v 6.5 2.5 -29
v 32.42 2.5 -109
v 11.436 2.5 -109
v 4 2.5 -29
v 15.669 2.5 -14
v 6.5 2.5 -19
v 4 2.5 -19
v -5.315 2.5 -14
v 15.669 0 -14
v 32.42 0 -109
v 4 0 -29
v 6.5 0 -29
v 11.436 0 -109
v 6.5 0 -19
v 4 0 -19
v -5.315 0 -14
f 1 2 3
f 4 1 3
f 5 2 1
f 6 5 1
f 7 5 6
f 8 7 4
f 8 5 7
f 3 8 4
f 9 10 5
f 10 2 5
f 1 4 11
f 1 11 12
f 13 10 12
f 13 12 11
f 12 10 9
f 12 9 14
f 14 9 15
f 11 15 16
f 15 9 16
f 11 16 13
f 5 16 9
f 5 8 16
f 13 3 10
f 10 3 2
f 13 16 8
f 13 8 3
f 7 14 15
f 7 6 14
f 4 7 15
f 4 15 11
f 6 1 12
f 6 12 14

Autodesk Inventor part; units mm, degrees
ref_plane "YZ Plane" through (0, 0, 0) normal (1, 0, 0) x (0, 1, 0)
ref_plane "XZ Plane" through (0, 0, 0) normal (0, 1, 0) x (-1, 0, 0)
ref_plane "XY Plane" through (0, 0, 0) normal (0, 0, 1) x (1, 0, 0)
sketch "スケッチ1" plane through (0, 0, 0) normal (0, 1, 0) x (-1, 0, 0)
  circle A0 centre (0, 0) radius 11
  line L0 (11, 10) -> (-11, 10)
  line L1 (-11, 10) -> (-11, -10)
  line L2 (-11, -10) -> (11, -10)
  line L3 (11, -10) -> (11, 10)
  line L4 (11, -10) -> (-11, -10)
  line L5 (-11, -10) -> (-11, -110)
  line L6 (-11, -110) -> (11, -110) construction
  line L7 (11, -110) -> (11, -10) construction
  arc A1 (-34.6127, -115.6757) -> (-13.3752, -120) centre (0, 0) ccw
  circle A2 centre (22, 0) radius 11
  circle A3 centre (-22, 0) radius 11
  line L8 (46.542, 0) -> (-48.2519, 0) projected
  line L9 (0, 0) -> (-13.7873, 2.4311)
  line L10 (-13.7873, 2.4311) -> (-34.6127, -115.6757)
  line L11 (22, 0) -> (8.2127, 2.4311)
  line L12 (8.2127, 2.4311) -> (-13.3752, -120)
  line L13 (8.2127, 2.4311) -> (8.9192, 6.438)
  line L14 (-13.7873, 2.4311) -> (-7.33, 8.2019)
  point P0 (11, 0)
  point P1 (11, 0)
  point P2 (4.5826, 10)
  point P3 (-4.5826, 10)
  point P4 (-11, 0)
  point P5 (-11, 0)
  point P6 (-11, 0)
  point P7 (4.5826, -10)
  point P8 (11, 0)
  point P9 (-11, 0)
  point P10 (-4.5826, -10)
  point P11 (4.5826, -10)
  point P12 (-4.5826, -10)
  point P13 (6.1794, -9.1003)
  point P14 (7.784, 0)
  point P15 (10.822, 1.971)
  point P16 (-14.216, 0)
  point P17 (11, 1.9396)
  dimension "d0" = 22
  dimension "d1" = 20
  dimension "d2" = 100
  dimension "d13" = 10
  dimension "d14" = 14
  dimension "d15" = 10
extrude "押し出し1" add sketch "スケッチ1" along normal blind 2.5 contours L12 L2 A0 | A0 L2 L8 L12 | L8 L9 A0 L0 L13 L12 | L2 L12 L5 A0 | A0 L2 | L8 A0 L9 | L2 L1 A0 | L12 A1 L10 A3 L1 L5 | L1 L9 A0 | A3 L9 L1 | L8 L10 L9 A3 | A3 L10 L8 | L9 L1 L14 A0 | L9 A3 L14 L1 | L9 L14 A3 picked at (-14.6149, -5.4805)
sketch "スケッチ2" plane through (0, 2.5, 0) normal (0, 1, 0) x (1, 0, 0)
  line L0 (33.6474, 115.9601) -> (12.5819, -3.5083)
  line L1 (13.7873, -2.4311) -> (34.6127, 115.6757) projected
  arc A0 (34.6127, 115.6757) -> (13.3752, 120) centre (0, 0) ccw projected
  line L2 (7.33, -8.2019) -> (13.7873, -2.4311) projected
  dimension "d16" = 1
extrude "押し出し2" cut sketch "スケッチ2" against normal through all
sketch "スケッチ3" plane through (0, 2.5, 0) normal (0, 1, 0) x (1, 0, 0)
  line L0 (-11, 14) -> (-4, 14) projected
  line L1 (-4, 14) -> (16.0696, 14)
  line L2 (12.5819, -3.5083) -> (33.6474, 115.9601) projected
  arc A0 (33.6474, 115.9601) -> (13.3752, 120) centre (0, 0) ccw projected
  line L3 (13.3752, 120) -> (-8.9192, -6.438) projected
  arc A1 (-8.9192, -6.438) -> (-4.5826, -10) centre (0, 0) ccw projected
  line L4 (-4.5826, -10) -> (4.5826, -10) projected
  arc A2 (4.5826, -10) -> (7.33, -8.2019) centre (0, 0) ccw projected
  line L5 (7.33, -8.2019) -> (12.5819, -3.5083) projected
  point P0 (15.6691, 14)
  point P1 (-5.3154, 14)
extrude "押し出し3" cut sketch "スケッチ3" against normal through all contours L0 L1 L2 L5 A2 L4 A1 L3
sketch "スケッチ4" plane through (0, 2.5, 0) normal (0, 1, 0) x (1, 0, 0)
  line L0 (6.5, 29) -> (6.5, 19) projected
  line L1 (4, 19) -> (4, 29) projected
  line L2 (4, 29) -> (6.5, 29) projected
  line L3 (6.5, 19) -> (4, 19) projected
  point P0 (0, 0)
extrude "押し出し4" cut sketch "スケッチ4" against normal through all
sketch "スケッチ5" plane through (0, 2.5, 0) normal (0, 1, 0) x (1, 0, 0)
  line L0 (11, 109) -> (-11, 109) projected
  line L1 (11, 109) -> (32.4202, 109)
  line L2 (33.6474, 115.9601) -> (15.6691, 14) projected
  line L3 (6.5, 19) -> (4, 19) projected
  line L4 (4, 19) -> (4, 29) projected
  line L5 (4, 29) -> (6.5, 29) projected
  line L6 (6.5, 29) -> (6.5, 19) projected
  line L7 (-5.3154, 14) -> (15.6691, 14) projected
  line L8 (15.6691, 14) -> (33.6474, 115.9601) projected
  arc A0 (33.6474, 115.9601) -> (13.3752, 120) centre (0, 0) ccw projected
  line L9 (13.3752, 120) -> (-5.3154, 14) projected
  point P0 (11.4356, 109)
extrude "押し出し5" cut sketch "スケッチ5" against normal through all contours L9 A0 L2 L1
properties part number "dish_under" material "木材 (カエデ材)"
